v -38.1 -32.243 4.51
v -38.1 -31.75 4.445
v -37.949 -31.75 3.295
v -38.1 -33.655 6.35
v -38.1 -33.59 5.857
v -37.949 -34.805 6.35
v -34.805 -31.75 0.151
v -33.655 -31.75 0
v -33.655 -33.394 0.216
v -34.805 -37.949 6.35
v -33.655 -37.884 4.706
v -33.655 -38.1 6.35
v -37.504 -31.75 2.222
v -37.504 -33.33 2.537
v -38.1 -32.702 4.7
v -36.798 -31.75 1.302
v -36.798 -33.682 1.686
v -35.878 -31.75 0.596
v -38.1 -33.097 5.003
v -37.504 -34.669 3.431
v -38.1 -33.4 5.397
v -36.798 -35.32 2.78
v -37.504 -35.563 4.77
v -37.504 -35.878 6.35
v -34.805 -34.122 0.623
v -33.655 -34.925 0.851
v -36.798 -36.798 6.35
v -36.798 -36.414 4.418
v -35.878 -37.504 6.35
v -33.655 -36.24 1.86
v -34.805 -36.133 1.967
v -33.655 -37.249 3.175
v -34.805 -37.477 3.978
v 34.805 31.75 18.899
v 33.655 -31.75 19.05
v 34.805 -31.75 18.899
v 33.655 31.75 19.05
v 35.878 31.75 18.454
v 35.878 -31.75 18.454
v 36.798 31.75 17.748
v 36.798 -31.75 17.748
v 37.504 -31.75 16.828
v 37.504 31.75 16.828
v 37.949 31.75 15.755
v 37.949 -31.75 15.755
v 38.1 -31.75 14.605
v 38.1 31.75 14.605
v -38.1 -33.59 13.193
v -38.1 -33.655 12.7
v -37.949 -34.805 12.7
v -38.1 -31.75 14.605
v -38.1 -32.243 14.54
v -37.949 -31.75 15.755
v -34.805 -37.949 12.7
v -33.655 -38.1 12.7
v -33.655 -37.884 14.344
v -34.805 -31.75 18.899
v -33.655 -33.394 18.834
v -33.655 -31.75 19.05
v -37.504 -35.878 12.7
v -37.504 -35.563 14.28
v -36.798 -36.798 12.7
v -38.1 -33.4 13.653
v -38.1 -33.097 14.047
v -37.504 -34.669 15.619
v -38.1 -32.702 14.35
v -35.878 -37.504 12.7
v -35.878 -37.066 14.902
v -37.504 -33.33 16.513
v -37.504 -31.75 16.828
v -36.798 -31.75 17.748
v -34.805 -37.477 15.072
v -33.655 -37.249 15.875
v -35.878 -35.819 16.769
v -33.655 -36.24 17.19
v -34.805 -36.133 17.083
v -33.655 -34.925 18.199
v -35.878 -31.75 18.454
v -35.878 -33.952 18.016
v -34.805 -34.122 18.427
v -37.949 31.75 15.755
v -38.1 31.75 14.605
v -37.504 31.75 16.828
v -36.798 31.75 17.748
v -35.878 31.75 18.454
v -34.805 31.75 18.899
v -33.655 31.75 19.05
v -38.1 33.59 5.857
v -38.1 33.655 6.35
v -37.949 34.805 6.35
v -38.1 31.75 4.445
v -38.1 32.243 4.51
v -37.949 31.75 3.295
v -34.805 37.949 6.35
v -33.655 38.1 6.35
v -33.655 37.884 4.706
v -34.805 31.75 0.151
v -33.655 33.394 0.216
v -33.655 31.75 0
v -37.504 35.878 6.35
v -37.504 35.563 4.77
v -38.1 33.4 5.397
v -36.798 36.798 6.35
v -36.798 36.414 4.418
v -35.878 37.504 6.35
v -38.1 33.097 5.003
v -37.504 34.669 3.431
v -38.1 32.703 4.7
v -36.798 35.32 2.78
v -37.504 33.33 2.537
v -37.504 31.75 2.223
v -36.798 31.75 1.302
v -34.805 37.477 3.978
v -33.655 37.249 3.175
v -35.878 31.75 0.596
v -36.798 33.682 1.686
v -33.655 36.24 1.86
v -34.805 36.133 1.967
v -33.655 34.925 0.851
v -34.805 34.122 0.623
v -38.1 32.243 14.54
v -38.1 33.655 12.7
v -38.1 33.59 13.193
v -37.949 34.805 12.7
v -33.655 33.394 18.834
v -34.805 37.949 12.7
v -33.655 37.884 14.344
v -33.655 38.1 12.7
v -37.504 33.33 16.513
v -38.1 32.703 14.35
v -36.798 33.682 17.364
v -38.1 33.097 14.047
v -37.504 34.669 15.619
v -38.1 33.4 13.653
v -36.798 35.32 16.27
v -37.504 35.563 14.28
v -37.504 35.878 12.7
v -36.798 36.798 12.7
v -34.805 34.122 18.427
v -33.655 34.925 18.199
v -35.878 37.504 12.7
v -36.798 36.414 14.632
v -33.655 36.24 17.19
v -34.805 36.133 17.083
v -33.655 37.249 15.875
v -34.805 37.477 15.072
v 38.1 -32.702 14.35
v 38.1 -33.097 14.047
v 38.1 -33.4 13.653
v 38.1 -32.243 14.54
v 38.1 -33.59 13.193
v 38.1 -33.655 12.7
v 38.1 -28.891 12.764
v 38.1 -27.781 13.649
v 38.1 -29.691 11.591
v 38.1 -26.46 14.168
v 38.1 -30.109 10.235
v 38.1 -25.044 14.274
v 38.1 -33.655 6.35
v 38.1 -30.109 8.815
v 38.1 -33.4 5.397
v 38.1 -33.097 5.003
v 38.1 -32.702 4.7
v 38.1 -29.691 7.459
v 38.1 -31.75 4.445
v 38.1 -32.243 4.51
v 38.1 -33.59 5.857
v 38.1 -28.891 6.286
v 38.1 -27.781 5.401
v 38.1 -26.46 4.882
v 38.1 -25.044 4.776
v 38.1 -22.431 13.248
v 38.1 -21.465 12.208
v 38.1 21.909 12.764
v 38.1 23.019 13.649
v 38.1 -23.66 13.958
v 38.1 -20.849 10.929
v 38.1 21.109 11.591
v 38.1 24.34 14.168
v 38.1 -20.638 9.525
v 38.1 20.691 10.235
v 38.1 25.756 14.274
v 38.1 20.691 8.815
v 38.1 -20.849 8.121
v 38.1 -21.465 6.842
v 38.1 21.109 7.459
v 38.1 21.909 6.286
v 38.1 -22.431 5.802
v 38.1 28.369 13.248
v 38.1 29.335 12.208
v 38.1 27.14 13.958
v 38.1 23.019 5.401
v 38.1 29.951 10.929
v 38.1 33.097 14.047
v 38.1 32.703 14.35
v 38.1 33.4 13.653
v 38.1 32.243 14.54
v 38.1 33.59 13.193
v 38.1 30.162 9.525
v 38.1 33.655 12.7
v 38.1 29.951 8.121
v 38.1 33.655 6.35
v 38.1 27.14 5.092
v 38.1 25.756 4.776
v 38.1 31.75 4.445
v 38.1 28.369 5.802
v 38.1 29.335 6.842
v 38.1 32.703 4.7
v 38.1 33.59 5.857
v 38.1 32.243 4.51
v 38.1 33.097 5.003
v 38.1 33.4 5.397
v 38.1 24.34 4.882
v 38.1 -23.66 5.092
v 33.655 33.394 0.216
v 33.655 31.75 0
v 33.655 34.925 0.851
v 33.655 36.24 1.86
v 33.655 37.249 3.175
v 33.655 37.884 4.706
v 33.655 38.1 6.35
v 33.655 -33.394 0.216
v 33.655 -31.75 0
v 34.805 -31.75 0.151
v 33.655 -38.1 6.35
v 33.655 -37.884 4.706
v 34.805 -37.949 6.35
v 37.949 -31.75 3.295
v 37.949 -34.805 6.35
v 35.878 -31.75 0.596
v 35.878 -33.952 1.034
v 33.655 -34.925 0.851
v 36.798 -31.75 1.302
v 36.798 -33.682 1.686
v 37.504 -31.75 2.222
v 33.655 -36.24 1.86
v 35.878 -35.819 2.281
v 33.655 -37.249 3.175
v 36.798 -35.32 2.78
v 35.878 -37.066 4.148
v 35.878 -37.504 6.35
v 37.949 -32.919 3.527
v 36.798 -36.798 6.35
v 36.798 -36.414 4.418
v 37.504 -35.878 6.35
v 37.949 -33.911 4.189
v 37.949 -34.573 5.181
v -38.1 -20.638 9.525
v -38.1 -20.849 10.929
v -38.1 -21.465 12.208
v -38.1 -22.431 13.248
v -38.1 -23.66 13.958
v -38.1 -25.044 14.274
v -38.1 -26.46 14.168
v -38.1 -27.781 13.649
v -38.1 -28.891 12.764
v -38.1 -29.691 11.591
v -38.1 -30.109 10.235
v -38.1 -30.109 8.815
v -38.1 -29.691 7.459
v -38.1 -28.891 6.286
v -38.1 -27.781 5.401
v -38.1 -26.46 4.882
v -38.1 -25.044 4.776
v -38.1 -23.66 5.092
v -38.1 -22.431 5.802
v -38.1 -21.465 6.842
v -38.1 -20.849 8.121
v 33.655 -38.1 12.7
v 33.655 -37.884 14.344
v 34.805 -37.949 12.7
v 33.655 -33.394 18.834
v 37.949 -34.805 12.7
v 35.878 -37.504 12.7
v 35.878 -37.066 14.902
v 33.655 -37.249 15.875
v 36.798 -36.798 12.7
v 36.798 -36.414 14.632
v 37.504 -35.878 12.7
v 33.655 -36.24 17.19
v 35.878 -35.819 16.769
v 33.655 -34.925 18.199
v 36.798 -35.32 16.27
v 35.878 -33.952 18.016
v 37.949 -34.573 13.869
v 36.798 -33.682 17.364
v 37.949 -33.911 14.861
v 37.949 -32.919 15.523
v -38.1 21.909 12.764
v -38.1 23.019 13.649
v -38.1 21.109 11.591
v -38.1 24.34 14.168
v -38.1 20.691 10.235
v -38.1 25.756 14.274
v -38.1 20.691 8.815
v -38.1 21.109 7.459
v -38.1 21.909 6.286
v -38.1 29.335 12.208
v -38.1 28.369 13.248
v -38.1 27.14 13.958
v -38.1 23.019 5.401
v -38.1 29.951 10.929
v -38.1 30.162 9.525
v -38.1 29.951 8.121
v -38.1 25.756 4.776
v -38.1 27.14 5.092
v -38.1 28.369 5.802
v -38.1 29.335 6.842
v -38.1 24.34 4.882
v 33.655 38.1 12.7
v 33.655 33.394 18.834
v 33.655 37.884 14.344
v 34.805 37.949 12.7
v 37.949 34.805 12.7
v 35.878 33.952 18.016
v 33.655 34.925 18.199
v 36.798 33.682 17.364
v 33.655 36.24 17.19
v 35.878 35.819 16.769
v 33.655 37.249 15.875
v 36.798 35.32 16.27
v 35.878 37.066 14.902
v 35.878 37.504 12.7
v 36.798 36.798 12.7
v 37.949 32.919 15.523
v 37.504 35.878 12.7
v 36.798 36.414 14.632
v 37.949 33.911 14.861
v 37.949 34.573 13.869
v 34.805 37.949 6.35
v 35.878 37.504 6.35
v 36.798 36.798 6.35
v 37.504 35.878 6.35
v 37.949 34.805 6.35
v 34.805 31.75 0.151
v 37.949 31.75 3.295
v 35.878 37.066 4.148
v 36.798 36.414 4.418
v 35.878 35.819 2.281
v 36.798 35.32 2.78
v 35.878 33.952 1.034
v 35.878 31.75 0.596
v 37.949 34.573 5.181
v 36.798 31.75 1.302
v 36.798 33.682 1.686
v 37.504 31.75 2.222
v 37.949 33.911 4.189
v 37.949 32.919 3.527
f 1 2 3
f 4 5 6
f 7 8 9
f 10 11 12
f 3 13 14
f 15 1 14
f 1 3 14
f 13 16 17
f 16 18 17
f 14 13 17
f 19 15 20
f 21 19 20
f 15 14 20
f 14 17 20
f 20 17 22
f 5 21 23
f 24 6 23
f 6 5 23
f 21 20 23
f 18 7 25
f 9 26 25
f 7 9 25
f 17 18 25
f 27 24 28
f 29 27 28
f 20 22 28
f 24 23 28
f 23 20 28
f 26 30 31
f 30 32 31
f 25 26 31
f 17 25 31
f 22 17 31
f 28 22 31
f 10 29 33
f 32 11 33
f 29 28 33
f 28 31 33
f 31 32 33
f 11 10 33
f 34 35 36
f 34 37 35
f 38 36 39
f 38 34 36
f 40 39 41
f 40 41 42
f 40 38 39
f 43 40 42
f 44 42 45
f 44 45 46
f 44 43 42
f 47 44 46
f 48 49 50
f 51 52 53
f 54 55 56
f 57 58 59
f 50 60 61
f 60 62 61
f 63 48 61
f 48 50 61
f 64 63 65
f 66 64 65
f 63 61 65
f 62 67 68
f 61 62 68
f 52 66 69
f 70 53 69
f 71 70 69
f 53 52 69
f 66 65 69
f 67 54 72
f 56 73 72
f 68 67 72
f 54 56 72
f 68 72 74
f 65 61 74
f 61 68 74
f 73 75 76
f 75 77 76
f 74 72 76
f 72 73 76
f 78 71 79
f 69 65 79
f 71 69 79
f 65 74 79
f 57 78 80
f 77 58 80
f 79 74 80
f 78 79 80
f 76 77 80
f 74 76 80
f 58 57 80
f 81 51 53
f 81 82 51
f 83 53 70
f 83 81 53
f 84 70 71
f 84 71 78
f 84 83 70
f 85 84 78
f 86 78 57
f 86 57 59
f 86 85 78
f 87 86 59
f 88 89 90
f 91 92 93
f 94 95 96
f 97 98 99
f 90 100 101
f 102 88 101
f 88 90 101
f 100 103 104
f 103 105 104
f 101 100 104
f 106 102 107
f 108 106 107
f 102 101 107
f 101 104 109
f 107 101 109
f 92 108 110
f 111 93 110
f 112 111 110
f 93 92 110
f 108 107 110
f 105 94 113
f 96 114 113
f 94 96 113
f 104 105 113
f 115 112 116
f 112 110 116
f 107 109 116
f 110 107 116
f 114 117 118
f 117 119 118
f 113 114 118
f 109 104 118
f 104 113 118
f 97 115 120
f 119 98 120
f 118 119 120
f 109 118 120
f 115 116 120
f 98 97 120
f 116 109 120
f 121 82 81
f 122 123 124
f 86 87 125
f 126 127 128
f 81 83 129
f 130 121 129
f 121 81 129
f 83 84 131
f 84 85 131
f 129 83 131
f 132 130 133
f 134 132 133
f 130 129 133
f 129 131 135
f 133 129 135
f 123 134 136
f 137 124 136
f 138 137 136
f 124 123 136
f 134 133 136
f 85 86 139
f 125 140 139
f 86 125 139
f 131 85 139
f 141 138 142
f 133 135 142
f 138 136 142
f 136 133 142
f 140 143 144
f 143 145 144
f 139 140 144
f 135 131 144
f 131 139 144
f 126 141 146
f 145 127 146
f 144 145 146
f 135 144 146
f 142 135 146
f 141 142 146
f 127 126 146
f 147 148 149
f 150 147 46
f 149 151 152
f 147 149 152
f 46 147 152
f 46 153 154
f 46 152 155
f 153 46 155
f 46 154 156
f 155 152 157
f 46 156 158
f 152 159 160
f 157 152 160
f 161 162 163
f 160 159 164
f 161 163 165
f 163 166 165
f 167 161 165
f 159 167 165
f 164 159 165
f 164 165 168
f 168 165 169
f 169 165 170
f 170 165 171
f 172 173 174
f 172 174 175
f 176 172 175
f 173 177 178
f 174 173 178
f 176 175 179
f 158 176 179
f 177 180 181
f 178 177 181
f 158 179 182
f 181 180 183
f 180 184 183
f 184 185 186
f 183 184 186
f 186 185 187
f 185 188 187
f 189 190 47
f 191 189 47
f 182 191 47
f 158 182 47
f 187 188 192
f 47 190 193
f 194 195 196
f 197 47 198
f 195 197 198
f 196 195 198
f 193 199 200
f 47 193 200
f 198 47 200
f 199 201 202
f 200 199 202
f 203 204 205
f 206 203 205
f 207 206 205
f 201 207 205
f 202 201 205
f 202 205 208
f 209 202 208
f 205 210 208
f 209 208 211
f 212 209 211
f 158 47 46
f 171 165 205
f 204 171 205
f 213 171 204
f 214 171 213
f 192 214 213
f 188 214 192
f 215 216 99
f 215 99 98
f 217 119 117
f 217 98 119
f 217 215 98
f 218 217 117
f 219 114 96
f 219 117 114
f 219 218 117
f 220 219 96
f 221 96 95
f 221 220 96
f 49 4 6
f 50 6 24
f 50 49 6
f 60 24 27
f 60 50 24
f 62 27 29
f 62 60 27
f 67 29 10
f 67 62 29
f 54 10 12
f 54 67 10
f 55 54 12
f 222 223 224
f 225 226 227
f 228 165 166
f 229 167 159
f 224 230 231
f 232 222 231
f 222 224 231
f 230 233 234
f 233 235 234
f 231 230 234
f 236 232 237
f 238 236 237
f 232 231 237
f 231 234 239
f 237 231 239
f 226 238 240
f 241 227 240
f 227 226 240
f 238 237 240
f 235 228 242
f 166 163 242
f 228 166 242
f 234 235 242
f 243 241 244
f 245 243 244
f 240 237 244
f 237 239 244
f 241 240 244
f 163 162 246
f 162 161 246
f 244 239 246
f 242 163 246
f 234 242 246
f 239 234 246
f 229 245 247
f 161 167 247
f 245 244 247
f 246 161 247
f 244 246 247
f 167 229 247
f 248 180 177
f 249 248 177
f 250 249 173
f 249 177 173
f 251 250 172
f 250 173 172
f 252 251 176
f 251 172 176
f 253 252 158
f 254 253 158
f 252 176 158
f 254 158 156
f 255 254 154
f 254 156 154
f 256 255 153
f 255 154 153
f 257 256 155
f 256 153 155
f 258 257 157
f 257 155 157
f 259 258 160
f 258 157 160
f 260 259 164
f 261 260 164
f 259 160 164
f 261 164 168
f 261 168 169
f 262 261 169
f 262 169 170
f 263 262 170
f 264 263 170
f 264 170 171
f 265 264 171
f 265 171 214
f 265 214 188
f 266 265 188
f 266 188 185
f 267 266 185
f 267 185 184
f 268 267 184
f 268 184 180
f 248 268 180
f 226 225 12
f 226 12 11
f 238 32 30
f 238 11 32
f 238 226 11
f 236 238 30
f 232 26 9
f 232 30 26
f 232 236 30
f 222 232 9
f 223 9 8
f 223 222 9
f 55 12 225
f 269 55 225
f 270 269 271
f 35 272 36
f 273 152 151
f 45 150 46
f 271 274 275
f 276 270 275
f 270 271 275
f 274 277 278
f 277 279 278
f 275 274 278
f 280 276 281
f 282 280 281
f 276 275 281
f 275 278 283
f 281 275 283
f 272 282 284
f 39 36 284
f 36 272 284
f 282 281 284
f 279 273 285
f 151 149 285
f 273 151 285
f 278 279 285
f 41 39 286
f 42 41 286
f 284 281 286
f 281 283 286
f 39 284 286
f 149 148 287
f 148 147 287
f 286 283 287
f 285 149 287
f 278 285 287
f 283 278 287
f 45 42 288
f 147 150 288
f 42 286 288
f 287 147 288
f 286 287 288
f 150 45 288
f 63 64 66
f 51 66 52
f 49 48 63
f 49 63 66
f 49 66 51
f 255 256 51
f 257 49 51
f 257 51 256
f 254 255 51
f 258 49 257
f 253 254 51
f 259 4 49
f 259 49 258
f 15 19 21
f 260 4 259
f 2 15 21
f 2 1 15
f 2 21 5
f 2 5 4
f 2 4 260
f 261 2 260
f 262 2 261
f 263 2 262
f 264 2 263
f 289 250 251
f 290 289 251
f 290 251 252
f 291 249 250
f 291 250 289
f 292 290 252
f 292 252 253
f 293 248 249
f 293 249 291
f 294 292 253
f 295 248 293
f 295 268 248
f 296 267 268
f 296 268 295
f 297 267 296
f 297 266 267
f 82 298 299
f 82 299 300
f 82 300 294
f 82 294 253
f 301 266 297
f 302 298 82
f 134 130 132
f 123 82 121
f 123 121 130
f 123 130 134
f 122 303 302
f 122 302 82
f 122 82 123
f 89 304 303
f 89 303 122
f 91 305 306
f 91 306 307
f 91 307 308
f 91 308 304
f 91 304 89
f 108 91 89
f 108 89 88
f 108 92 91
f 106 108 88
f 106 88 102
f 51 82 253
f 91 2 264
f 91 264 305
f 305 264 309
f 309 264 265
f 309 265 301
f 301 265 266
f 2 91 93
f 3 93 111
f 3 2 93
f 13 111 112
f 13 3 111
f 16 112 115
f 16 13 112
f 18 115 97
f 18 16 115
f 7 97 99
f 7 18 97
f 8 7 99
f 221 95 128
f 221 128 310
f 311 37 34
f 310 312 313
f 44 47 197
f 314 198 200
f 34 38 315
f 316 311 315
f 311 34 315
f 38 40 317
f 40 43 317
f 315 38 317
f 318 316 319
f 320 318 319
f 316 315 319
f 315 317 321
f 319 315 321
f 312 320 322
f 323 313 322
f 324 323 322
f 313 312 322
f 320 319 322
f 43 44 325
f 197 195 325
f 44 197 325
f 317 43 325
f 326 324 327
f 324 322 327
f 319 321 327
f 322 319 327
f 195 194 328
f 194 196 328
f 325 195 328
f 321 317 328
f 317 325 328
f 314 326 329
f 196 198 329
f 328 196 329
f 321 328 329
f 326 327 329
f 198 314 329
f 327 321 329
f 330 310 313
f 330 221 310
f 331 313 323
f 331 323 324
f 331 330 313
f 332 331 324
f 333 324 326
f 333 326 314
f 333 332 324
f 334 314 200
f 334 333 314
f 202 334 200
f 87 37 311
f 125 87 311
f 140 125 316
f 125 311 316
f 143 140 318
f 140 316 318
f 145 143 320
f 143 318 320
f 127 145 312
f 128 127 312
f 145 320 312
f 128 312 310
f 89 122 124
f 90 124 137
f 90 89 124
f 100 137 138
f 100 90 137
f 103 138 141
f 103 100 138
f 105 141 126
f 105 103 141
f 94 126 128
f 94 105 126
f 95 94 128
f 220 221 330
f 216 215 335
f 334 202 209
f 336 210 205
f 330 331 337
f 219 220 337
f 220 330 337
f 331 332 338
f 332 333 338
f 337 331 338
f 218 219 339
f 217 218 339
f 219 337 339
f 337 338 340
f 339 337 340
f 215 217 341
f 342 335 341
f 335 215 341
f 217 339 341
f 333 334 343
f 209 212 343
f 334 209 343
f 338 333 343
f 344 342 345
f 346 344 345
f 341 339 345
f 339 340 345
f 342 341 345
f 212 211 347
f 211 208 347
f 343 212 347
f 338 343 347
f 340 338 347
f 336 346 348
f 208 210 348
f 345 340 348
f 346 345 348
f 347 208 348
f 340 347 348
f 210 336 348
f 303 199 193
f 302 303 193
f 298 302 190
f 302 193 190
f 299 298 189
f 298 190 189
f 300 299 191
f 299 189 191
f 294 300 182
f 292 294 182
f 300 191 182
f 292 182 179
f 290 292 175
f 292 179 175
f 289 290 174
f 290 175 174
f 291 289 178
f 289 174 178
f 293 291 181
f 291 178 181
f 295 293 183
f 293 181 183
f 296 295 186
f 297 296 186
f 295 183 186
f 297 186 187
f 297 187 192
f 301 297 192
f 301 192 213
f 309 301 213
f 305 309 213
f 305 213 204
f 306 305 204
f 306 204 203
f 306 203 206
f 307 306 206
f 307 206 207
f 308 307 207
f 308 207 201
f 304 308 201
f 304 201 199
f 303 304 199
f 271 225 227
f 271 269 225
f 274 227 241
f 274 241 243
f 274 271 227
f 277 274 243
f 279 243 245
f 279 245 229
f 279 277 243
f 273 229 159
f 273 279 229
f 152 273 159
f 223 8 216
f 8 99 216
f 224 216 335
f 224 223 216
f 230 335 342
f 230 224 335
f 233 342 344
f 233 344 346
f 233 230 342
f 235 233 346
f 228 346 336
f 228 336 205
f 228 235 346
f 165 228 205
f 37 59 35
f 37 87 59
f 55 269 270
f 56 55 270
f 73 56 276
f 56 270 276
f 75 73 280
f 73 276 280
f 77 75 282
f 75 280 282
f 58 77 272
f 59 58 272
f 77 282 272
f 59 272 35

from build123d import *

# Parameters (mm, degrees)
F0_W     = 76.2
F0_H     = 76.2
F1_DEPTH = 19.05
F3_D     = 9.525
F4_R     = 6.35
F5_R     = 4.445


with BuildPart() as f1:
    # F0 (on Top) → F1 (new body)
    with BuildSketch(Plane.XY):
        Rectangle(F0_W, F0_H)
    extrude(amount=F1_DEPTH)

    # F3 (through all)
    with Locations(Plane(origin=(-38.1, 0, 0), x_dir=(0, -1, 0), z_dir=(-1, 0, 0))):
        with Locations((-25.4, 9.525), (25.4, 9.525)):
            Hole(F3_D / 2)

    # F4
    f4_edges = [f1.edges().sort_by_distance(p)[0] for p in [
        (0, -38.1, 19.05),
        (0, -38.1, 0),
        (0, 38.1, 19.05),
        (0, 38.1, 0),
    ]]
    fillet(f4_edges, radius=F4_R)

    # F5
    f5_edges = [f1.edges().sort_by_distance(p)[0] for p in [
        (-38.1, 0, 19.05),
        (38.1, 0, 19.05),
    ]]
    fillet(f5_edges, radius=F5_R)


solid = f1.part
